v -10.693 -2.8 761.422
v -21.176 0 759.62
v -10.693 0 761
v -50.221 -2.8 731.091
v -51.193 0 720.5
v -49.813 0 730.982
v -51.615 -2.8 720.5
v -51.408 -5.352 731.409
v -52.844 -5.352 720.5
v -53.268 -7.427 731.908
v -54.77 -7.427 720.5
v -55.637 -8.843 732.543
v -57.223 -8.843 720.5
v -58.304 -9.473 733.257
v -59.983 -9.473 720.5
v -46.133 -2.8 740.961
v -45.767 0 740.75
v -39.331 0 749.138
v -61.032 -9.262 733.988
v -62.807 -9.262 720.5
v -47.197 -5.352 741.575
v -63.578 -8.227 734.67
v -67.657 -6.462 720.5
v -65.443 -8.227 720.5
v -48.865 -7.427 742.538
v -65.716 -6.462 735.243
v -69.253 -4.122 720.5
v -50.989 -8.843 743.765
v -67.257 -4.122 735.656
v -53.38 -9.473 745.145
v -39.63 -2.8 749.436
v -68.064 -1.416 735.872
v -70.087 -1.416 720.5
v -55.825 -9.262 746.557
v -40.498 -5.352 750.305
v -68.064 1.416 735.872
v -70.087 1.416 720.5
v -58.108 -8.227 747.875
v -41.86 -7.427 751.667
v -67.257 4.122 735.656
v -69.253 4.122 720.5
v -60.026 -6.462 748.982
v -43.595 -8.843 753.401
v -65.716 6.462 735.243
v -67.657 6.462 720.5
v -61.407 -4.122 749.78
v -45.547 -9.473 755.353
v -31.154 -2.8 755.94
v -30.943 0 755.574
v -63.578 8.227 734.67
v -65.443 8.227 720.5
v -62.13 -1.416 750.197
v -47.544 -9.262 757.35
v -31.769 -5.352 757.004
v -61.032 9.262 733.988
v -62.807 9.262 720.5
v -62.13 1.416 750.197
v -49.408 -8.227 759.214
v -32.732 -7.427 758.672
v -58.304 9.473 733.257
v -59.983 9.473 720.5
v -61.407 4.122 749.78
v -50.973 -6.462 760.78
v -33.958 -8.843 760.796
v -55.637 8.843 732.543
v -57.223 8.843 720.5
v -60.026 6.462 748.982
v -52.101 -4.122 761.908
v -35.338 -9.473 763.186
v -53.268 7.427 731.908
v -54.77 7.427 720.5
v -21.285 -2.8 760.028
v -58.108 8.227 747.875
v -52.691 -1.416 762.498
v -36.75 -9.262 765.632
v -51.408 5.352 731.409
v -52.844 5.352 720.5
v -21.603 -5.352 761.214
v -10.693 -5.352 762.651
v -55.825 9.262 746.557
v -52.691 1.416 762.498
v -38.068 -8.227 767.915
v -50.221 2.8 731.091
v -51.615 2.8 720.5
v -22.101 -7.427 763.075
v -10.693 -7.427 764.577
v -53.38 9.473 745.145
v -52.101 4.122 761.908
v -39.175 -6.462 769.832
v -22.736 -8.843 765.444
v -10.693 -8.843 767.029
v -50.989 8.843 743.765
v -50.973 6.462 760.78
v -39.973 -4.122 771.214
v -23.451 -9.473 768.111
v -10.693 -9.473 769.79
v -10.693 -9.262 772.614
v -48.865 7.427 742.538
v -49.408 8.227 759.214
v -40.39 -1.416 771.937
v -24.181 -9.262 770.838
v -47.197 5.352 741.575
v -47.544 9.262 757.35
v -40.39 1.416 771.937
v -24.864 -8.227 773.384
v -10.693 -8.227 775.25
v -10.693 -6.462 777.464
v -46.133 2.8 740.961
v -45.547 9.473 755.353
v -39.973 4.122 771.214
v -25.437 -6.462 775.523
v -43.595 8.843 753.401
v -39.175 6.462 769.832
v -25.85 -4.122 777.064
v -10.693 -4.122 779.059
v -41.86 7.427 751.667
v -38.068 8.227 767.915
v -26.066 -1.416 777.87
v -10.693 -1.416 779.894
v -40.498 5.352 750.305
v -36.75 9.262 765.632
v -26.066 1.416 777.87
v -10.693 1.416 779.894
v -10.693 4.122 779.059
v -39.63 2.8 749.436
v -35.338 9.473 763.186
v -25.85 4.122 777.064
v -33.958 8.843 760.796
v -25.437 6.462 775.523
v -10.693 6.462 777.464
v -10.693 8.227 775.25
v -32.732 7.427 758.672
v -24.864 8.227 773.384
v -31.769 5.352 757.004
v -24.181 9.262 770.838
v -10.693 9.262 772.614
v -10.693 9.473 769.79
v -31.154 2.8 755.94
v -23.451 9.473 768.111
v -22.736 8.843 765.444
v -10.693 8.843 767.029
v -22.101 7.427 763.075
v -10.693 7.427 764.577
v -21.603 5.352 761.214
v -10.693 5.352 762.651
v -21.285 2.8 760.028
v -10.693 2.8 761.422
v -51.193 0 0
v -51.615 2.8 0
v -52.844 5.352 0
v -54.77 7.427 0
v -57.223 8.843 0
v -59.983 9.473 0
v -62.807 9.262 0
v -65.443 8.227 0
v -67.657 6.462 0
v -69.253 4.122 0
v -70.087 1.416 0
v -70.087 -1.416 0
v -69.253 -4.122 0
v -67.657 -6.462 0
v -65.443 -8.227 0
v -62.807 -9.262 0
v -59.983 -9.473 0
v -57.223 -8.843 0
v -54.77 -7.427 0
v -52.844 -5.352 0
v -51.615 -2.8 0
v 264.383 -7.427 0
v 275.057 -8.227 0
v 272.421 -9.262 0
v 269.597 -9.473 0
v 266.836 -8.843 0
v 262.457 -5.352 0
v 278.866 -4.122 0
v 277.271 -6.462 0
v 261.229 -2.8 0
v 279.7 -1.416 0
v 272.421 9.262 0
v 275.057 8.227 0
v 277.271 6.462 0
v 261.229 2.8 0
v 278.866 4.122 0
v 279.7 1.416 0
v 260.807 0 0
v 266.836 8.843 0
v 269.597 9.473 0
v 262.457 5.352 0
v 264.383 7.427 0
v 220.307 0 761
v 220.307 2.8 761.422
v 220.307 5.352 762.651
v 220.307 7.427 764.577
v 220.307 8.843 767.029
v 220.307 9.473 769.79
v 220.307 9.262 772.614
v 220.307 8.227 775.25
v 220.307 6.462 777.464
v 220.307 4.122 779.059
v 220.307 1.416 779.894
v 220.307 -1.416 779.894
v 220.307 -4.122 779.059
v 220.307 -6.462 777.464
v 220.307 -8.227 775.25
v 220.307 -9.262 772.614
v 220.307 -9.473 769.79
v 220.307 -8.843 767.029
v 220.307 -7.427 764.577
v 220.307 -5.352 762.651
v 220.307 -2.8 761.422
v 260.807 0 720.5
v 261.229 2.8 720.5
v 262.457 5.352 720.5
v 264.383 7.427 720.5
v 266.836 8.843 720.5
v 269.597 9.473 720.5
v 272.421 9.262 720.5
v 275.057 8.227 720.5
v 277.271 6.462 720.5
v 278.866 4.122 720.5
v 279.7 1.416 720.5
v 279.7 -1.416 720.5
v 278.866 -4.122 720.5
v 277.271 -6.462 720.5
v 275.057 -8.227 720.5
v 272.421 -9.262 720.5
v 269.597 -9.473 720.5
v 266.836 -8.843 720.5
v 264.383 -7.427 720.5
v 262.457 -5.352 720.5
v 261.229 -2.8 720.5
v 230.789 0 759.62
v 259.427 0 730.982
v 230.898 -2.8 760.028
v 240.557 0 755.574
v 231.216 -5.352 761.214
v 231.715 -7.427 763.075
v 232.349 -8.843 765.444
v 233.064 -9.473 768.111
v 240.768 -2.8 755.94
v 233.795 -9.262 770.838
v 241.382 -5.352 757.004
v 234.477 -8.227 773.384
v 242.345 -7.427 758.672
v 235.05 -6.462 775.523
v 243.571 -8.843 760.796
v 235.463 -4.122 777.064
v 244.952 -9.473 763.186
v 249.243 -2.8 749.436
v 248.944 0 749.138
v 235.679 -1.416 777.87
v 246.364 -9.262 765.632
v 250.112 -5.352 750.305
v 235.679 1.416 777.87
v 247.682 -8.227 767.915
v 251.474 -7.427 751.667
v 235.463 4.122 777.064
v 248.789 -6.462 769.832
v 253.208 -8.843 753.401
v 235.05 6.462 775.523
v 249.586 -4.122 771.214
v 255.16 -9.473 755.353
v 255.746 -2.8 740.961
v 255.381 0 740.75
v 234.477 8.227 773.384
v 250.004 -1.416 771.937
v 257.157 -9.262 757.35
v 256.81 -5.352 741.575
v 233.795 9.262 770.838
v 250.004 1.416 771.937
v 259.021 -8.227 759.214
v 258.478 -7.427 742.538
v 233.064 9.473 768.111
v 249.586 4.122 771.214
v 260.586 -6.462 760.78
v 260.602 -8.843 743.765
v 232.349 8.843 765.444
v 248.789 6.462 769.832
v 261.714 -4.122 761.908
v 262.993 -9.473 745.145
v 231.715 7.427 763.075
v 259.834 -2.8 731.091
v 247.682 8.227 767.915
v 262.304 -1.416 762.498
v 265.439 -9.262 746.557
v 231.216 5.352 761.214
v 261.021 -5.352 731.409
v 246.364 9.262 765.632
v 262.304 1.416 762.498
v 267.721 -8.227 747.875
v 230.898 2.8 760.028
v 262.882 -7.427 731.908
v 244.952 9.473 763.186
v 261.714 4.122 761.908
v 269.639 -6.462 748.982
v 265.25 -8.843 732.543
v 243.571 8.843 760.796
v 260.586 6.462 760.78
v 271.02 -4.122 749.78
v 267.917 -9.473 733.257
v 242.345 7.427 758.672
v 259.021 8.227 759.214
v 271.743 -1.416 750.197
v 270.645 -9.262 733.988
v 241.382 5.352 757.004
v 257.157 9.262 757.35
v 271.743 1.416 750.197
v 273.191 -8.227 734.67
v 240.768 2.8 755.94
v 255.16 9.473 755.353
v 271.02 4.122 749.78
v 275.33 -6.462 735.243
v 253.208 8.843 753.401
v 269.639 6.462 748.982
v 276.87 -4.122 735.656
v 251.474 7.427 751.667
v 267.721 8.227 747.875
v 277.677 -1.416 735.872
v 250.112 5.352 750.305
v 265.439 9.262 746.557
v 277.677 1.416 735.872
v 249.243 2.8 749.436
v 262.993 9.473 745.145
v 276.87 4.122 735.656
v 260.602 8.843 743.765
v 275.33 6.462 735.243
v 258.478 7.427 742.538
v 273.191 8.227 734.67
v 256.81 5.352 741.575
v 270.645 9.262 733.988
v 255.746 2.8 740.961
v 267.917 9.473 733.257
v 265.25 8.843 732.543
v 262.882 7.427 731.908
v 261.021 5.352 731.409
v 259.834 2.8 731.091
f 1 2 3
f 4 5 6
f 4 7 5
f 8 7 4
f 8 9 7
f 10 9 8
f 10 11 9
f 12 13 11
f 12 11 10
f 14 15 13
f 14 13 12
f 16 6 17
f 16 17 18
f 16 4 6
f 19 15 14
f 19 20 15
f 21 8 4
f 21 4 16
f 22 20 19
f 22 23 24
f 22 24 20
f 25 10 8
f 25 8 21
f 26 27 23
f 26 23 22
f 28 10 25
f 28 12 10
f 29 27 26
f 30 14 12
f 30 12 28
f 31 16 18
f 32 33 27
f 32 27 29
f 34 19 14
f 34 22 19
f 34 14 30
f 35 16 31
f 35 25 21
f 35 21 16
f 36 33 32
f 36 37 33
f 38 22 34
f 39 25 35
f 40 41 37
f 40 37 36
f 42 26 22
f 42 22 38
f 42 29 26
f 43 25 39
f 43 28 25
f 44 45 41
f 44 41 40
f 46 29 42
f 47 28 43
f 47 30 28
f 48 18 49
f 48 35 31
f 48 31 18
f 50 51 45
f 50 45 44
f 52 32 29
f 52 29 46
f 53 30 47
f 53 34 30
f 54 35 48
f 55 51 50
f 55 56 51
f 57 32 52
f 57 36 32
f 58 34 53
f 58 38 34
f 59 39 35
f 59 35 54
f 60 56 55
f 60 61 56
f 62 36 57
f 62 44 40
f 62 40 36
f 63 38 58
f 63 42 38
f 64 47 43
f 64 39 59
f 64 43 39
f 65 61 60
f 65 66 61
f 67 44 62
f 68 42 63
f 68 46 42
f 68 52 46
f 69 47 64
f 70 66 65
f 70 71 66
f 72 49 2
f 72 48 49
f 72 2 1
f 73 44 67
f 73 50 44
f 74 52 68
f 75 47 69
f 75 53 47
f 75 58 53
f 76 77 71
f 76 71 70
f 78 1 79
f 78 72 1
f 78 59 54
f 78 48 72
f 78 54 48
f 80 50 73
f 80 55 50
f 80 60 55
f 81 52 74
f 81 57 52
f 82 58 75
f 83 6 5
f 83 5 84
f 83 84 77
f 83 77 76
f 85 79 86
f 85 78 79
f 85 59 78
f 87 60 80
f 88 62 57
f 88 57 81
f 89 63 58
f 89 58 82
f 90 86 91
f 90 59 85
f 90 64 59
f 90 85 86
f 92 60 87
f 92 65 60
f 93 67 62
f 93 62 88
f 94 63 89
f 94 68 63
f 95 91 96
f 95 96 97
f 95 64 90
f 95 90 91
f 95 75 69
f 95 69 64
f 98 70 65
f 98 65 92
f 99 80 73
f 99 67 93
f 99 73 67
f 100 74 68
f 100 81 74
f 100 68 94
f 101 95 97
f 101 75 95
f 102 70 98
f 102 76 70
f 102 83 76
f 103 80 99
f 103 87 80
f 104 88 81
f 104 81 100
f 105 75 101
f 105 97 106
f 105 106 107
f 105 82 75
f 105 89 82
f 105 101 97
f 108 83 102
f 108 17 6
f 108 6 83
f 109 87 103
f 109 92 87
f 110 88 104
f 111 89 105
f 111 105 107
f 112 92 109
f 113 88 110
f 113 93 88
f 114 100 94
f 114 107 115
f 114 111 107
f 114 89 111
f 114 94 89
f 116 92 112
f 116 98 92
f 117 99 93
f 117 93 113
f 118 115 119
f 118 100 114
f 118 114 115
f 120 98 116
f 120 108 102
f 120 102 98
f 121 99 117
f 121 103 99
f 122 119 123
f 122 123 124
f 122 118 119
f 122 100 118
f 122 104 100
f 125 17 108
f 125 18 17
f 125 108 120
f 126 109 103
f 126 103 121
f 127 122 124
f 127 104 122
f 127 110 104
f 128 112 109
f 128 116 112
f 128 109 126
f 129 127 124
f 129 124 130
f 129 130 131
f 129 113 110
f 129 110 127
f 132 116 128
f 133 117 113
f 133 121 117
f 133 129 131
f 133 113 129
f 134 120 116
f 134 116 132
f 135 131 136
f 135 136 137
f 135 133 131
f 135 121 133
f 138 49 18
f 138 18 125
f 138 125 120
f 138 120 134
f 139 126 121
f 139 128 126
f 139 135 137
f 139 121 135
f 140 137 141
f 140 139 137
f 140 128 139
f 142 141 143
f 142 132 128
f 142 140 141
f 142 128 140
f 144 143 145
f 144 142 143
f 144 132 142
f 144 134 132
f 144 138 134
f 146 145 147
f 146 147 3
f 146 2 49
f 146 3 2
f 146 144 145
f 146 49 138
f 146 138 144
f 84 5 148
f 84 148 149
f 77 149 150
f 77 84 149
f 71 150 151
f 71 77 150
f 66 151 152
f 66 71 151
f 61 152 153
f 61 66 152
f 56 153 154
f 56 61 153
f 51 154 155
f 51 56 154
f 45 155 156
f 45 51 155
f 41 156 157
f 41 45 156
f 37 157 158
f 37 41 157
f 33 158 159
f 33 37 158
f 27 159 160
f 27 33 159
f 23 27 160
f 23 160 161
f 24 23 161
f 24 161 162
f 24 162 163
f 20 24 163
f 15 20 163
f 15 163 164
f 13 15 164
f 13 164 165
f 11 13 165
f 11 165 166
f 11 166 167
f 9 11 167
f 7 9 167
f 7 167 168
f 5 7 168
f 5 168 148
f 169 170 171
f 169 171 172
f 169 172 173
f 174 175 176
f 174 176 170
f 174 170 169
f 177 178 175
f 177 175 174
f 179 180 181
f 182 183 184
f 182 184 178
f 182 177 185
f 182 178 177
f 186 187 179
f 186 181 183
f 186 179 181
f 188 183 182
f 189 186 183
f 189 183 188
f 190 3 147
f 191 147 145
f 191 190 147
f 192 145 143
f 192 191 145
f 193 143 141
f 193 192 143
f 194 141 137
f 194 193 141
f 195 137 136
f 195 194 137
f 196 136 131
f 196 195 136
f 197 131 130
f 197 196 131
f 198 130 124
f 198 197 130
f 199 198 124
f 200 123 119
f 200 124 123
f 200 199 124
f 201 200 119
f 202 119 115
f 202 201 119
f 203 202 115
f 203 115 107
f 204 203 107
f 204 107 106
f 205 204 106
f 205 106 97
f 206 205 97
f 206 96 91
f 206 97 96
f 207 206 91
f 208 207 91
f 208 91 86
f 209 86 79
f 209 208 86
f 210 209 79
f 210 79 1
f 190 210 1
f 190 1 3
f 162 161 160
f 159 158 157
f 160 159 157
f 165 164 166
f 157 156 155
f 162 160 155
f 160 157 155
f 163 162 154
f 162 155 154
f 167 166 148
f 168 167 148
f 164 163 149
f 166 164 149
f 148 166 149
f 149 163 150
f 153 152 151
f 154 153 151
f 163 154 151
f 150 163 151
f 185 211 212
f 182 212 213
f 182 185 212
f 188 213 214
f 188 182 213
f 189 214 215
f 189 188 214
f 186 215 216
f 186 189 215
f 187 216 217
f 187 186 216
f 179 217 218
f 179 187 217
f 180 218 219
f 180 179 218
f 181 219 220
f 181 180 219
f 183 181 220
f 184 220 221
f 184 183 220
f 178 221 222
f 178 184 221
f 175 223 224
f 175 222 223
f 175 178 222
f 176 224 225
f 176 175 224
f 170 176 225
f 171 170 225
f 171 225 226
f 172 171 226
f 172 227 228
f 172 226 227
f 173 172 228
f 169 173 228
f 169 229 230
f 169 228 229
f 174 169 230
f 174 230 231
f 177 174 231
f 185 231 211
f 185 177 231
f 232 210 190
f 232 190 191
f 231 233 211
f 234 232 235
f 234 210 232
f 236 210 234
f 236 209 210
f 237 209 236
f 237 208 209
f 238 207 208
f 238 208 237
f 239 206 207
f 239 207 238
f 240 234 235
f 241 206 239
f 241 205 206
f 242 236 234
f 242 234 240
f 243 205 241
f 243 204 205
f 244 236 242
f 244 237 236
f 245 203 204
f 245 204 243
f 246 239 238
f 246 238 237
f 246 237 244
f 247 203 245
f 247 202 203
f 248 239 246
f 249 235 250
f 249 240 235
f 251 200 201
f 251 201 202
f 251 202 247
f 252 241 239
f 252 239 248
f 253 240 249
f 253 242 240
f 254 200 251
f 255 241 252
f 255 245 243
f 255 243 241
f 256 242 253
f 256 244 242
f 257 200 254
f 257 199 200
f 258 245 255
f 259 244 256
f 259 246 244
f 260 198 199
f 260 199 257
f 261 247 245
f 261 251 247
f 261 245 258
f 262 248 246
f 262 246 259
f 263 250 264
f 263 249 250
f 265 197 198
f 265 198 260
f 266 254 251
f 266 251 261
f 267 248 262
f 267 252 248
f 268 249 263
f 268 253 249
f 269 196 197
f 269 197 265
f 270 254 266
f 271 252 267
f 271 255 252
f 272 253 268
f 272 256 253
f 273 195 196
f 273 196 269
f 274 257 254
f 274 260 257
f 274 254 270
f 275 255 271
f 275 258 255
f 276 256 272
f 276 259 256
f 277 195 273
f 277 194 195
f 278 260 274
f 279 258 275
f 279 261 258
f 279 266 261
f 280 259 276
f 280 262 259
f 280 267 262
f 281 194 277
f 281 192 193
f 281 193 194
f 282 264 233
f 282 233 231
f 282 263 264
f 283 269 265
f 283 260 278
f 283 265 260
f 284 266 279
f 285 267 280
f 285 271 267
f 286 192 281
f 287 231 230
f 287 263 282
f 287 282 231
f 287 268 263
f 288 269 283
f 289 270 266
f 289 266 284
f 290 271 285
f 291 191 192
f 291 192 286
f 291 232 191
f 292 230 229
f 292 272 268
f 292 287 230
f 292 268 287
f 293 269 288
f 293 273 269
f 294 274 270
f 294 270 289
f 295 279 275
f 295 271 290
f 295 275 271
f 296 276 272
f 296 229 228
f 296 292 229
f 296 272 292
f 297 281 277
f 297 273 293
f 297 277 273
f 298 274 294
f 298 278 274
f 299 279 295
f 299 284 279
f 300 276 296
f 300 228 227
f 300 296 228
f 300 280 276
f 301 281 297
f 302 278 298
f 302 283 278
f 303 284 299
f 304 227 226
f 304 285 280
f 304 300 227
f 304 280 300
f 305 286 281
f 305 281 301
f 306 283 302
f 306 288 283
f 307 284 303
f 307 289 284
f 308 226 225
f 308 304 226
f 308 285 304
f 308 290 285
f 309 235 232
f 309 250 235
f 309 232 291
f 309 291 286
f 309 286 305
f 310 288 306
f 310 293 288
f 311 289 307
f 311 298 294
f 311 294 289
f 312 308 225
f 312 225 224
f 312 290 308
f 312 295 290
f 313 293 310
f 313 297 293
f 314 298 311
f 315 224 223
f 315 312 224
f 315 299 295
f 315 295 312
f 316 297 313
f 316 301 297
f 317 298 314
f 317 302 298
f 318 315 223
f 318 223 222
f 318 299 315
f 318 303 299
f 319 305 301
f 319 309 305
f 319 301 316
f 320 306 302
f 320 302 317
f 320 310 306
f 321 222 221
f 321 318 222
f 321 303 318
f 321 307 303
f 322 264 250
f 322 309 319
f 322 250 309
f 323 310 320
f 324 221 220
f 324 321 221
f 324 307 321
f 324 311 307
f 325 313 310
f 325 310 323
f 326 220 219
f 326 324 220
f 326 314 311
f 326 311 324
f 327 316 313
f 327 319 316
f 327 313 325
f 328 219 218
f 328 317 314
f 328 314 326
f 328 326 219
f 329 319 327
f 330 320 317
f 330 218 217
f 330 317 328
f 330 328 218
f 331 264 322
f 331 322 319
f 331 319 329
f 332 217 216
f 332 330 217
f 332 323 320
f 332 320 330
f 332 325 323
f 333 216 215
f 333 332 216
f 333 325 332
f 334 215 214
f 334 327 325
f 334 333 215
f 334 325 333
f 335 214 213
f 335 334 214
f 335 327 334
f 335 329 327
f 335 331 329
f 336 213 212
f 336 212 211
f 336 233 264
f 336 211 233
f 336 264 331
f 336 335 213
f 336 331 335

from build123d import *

# Parameters (mm, degrees)
F2_R = 9.5


with BuildPart() as f3:
    # F3: sweep along a path in F0
    with BuildLine(Plane.XZ) as f3_path:
        Line((-60.6934127808, 0), (-60.6934127808, 720.5))
        ThreePointArc((-60.6934127808, 720.5), (-46.0487518401, 755.8553390593), (-10.6934127808, 770.5))
        Line((-10.6934127808, 770.5), (220.3065872192, 770.5))
        ThreePointArc((220.3065872192, 770.5), (255.6619262786, 755.8553390593), (270.3065872192, 720.5))
        Line((270.3065872192, 720.5), (270.3065872192, 0))
    # F2 (on face) → F3 (sweep)
    with BuildSketch(Plane.XY):
        with Locations((-60.6934127808, 0)):
            Circle(F2_R)
    sweep(path=f3_path.line)


solid = f3.part
